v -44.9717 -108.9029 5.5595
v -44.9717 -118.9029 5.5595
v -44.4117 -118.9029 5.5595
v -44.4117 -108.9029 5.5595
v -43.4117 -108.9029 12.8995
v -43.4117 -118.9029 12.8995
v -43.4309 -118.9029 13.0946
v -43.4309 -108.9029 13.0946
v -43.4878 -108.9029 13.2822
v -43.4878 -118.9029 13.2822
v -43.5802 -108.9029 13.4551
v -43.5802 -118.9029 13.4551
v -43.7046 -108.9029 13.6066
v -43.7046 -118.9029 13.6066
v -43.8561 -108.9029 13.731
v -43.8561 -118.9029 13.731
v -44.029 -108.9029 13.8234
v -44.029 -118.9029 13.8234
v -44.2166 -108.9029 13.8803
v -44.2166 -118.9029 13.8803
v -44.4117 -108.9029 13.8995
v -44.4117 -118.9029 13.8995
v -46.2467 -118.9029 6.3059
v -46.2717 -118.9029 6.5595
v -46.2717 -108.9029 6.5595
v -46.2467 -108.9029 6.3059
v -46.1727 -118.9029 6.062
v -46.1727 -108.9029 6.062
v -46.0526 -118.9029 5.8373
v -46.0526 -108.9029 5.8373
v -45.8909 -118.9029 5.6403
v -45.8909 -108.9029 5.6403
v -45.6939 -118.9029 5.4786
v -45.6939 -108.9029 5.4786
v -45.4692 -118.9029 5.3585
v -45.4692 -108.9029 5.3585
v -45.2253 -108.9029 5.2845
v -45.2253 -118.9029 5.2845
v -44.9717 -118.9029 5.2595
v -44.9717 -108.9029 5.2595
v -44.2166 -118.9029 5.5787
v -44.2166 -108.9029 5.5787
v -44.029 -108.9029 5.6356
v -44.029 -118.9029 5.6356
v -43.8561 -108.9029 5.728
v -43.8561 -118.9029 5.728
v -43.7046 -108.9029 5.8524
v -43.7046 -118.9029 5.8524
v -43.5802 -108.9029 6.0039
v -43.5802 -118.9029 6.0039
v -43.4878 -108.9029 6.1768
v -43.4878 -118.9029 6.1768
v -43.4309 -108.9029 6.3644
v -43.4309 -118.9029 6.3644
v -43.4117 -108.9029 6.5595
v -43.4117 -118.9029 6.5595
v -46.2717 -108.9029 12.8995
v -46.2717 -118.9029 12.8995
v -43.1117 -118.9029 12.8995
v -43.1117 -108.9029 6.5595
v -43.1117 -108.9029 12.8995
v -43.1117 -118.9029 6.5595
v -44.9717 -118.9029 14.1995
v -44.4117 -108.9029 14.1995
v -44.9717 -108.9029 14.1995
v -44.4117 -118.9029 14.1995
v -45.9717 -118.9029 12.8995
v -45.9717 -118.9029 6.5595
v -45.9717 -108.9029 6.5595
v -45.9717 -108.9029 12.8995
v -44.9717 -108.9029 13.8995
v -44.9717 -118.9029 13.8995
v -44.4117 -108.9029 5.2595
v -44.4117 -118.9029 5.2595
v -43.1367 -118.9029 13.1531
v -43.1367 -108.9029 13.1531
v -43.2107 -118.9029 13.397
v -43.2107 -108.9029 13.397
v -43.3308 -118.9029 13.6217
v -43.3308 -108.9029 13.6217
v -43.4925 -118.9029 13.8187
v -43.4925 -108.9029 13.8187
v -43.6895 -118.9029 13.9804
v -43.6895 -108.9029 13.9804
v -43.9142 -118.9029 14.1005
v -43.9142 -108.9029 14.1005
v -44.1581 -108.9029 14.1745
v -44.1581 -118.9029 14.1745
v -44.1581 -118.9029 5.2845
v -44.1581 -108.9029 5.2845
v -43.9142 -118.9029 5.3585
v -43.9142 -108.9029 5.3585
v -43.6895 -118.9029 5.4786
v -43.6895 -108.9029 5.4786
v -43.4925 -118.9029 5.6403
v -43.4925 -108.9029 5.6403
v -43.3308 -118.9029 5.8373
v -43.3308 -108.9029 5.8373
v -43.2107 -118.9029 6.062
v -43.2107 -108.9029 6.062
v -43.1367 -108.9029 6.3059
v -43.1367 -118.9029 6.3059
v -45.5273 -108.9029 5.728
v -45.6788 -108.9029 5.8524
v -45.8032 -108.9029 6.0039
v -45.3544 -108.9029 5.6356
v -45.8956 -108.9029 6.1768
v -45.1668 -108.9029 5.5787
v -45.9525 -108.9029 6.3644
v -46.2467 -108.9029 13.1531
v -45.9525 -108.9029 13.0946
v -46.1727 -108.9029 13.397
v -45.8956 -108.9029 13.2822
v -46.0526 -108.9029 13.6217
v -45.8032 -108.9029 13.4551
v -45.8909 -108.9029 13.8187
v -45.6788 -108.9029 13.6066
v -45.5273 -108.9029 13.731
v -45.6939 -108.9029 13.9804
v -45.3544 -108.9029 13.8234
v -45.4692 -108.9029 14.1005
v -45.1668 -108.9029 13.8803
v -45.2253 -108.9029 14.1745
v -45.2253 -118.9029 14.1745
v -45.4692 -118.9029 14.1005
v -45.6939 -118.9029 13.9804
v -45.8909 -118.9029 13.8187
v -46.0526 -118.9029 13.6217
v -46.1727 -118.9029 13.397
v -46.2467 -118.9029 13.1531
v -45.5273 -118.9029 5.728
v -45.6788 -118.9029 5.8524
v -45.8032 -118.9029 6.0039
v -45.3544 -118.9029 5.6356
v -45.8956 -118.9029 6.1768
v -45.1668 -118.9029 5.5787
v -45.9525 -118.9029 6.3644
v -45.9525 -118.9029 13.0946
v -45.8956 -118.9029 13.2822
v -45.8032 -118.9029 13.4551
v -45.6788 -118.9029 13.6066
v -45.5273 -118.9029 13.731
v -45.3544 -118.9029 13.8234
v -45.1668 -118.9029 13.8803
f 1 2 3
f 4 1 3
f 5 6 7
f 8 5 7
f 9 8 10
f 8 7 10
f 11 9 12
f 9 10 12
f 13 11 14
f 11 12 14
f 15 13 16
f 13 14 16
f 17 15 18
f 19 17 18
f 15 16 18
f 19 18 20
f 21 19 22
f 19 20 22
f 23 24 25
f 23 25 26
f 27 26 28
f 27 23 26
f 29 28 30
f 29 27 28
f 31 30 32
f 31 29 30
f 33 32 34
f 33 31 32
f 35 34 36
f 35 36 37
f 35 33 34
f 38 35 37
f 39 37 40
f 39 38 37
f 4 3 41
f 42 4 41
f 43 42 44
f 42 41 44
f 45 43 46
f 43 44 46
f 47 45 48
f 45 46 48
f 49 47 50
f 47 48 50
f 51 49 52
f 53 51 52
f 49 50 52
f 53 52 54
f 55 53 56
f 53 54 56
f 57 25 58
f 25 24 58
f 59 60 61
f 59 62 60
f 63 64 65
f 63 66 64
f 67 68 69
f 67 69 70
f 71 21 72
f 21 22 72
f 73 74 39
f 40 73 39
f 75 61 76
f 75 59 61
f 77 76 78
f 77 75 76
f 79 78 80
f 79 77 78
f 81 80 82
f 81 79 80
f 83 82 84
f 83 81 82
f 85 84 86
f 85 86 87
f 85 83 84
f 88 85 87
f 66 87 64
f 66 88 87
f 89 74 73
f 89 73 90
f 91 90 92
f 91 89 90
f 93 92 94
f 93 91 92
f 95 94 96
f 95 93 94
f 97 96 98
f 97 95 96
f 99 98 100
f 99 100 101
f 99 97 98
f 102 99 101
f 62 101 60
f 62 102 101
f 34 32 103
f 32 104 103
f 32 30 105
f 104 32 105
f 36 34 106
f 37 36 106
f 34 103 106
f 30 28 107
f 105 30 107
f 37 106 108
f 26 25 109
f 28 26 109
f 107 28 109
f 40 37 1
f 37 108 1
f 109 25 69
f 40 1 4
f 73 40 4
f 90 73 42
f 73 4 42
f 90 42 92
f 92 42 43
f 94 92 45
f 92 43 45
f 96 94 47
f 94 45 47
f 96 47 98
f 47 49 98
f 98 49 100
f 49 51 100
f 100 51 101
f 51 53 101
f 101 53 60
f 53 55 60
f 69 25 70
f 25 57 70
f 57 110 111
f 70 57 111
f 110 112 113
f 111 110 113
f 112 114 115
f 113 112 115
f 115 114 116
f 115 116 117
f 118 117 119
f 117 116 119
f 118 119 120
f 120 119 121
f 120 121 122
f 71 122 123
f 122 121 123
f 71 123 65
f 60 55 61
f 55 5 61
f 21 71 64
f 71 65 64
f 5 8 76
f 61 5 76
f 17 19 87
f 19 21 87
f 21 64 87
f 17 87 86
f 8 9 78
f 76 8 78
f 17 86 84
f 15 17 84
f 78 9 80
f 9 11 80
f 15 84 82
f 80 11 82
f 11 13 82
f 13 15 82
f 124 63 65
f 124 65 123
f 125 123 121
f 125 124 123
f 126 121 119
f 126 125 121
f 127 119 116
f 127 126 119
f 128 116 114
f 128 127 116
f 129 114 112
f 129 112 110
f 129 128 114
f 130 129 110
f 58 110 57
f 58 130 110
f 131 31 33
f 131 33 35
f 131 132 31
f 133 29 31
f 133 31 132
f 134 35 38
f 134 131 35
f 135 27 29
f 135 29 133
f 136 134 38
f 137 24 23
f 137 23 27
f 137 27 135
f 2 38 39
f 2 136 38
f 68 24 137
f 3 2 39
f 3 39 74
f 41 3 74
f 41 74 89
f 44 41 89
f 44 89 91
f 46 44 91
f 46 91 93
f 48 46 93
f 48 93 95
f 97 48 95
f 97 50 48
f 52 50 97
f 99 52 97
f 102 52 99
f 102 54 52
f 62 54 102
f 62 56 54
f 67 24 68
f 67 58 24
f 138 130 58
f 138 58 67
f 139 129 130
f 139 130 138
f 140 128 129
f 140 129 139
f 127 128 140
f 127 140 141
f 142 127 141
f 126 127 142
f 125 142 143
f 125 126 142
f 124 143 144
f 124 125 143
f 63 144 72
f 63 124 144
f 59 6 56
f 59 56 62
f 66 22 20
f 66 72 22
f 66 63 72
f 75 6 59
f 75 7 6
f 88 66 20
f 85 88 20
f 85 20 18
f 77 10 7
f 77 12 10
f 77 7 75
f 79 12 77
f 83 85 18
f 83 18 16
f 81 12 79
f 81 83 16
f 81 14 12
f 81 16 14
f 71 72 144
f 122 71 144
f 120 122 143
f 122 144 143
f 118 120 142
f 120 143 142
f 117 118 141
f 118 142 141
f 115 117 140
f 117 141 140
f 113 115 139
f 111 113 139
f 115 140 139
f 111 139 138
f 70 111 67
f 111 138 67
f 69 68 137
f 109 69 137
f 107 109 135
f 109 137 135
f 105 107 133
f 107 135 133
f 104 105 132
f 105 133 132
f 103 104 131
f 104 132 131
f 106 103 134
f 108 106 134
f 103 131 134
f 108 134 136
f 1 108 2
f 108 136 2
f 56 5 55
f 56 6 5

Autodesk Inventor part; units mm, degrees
ref_plane "YZ Plane" through (0, 0, 0) normal (1, 0, 0) x (0, 1, 0)
ref_plane "XZ Plane" through (0, 0, 0) normal (0, 1, 0) x (-1, 0, 0)
ref_plane "XY Plane" through (0, 0, 0) normal (0, 0, 1) x (1, 0, 0)
ref_plane "Arbeitsebene1" through (-28.1717, -118.9029, 44.8795) normal (0, -1, 0) x (1, 0, 0)
sketch "Skizze1" plane through (-28.1717, -118.9029, 44.8795) normal (0, -1, 0) x (1, 0, 0)
  line L0 (-16.24, -39.62) -> (-16.8, -39.62) projected
  arc A0 (-16.24, -39.62) -> (-14.94, -38.32) centre (-16.24, -38.32) ccw projected
  line L1 (-14.94, -38.32) -> (-14.94, -31.98) projected
  arc A1 (-14.94, -31.98) -> (-16.24, -30.68) centre (-16.24, -31.98) ccw projected
  line L2 (-16.24, -30.68) -> (-16.8, -30.68) projected
  arc A2 (-16.8, -30.68) -> (-18.1, -31.98) centre (-16.8, -31.98) ccw projected
  line L3 (-18.1, -38.32) -> (-18.1, -31.98) projected
  arc A3 (-18.1, -38.32) -> (-16.8, -39.62) centre (-16.8, -38.32) ccw projected
  arc A4 (-16.8, -30.98) -> (-17.8, -31.98) centre (-16.8, -31.98) ccw projected
  line L4 (-16.24, -30.98) -> (-16.8, -30.98) projected
  arc A5 (-15.24, -31.98) -> (-16.24, -30.98) centre (-16.24, -31.98) ccw projected
  line L5 (-15.24, -31.98) -> (-15.24, -38.32) projected
  arc A6 (-16.24, -39.32) -> (-15.24, -38.32) centre (-16.24, -38.32) ccw projected
  line L6 (-16.8, -39.32) -> (-16.24, -39.32) projected
  arc A7 (-17.8, -38.32) -> (-16.8, -39.32) centre (-16.8, -38.32) ccw projected
  line L7 (-17.8, -38.32) -> (-17.8, -31.98) projected
  point P0 (28.1717, -44.8795)
extrude "Extrusion1" add sketch "Skizze1" against normal blind 10
equation "\"d_tol\" = 0.3"
equation "\"d_wand\" = 1.5"
equation "\"r_rasp_pi\" = 3"
equation "\"D_oct\" = 3621.32034"
equation "\"d_traeger\" = 625"
equation "\"l_rasp_pi\" = 85"
equation "\"w_kamera_vert\" = 41deg"
equation "\"w_kamera_hori\" = 66deg"
equation "\"D_hexadeca\" = 7541.00924"
equation "\"b_rasp_pi\" = 56"
properties part number "Camera_Assembly_Electrical"
